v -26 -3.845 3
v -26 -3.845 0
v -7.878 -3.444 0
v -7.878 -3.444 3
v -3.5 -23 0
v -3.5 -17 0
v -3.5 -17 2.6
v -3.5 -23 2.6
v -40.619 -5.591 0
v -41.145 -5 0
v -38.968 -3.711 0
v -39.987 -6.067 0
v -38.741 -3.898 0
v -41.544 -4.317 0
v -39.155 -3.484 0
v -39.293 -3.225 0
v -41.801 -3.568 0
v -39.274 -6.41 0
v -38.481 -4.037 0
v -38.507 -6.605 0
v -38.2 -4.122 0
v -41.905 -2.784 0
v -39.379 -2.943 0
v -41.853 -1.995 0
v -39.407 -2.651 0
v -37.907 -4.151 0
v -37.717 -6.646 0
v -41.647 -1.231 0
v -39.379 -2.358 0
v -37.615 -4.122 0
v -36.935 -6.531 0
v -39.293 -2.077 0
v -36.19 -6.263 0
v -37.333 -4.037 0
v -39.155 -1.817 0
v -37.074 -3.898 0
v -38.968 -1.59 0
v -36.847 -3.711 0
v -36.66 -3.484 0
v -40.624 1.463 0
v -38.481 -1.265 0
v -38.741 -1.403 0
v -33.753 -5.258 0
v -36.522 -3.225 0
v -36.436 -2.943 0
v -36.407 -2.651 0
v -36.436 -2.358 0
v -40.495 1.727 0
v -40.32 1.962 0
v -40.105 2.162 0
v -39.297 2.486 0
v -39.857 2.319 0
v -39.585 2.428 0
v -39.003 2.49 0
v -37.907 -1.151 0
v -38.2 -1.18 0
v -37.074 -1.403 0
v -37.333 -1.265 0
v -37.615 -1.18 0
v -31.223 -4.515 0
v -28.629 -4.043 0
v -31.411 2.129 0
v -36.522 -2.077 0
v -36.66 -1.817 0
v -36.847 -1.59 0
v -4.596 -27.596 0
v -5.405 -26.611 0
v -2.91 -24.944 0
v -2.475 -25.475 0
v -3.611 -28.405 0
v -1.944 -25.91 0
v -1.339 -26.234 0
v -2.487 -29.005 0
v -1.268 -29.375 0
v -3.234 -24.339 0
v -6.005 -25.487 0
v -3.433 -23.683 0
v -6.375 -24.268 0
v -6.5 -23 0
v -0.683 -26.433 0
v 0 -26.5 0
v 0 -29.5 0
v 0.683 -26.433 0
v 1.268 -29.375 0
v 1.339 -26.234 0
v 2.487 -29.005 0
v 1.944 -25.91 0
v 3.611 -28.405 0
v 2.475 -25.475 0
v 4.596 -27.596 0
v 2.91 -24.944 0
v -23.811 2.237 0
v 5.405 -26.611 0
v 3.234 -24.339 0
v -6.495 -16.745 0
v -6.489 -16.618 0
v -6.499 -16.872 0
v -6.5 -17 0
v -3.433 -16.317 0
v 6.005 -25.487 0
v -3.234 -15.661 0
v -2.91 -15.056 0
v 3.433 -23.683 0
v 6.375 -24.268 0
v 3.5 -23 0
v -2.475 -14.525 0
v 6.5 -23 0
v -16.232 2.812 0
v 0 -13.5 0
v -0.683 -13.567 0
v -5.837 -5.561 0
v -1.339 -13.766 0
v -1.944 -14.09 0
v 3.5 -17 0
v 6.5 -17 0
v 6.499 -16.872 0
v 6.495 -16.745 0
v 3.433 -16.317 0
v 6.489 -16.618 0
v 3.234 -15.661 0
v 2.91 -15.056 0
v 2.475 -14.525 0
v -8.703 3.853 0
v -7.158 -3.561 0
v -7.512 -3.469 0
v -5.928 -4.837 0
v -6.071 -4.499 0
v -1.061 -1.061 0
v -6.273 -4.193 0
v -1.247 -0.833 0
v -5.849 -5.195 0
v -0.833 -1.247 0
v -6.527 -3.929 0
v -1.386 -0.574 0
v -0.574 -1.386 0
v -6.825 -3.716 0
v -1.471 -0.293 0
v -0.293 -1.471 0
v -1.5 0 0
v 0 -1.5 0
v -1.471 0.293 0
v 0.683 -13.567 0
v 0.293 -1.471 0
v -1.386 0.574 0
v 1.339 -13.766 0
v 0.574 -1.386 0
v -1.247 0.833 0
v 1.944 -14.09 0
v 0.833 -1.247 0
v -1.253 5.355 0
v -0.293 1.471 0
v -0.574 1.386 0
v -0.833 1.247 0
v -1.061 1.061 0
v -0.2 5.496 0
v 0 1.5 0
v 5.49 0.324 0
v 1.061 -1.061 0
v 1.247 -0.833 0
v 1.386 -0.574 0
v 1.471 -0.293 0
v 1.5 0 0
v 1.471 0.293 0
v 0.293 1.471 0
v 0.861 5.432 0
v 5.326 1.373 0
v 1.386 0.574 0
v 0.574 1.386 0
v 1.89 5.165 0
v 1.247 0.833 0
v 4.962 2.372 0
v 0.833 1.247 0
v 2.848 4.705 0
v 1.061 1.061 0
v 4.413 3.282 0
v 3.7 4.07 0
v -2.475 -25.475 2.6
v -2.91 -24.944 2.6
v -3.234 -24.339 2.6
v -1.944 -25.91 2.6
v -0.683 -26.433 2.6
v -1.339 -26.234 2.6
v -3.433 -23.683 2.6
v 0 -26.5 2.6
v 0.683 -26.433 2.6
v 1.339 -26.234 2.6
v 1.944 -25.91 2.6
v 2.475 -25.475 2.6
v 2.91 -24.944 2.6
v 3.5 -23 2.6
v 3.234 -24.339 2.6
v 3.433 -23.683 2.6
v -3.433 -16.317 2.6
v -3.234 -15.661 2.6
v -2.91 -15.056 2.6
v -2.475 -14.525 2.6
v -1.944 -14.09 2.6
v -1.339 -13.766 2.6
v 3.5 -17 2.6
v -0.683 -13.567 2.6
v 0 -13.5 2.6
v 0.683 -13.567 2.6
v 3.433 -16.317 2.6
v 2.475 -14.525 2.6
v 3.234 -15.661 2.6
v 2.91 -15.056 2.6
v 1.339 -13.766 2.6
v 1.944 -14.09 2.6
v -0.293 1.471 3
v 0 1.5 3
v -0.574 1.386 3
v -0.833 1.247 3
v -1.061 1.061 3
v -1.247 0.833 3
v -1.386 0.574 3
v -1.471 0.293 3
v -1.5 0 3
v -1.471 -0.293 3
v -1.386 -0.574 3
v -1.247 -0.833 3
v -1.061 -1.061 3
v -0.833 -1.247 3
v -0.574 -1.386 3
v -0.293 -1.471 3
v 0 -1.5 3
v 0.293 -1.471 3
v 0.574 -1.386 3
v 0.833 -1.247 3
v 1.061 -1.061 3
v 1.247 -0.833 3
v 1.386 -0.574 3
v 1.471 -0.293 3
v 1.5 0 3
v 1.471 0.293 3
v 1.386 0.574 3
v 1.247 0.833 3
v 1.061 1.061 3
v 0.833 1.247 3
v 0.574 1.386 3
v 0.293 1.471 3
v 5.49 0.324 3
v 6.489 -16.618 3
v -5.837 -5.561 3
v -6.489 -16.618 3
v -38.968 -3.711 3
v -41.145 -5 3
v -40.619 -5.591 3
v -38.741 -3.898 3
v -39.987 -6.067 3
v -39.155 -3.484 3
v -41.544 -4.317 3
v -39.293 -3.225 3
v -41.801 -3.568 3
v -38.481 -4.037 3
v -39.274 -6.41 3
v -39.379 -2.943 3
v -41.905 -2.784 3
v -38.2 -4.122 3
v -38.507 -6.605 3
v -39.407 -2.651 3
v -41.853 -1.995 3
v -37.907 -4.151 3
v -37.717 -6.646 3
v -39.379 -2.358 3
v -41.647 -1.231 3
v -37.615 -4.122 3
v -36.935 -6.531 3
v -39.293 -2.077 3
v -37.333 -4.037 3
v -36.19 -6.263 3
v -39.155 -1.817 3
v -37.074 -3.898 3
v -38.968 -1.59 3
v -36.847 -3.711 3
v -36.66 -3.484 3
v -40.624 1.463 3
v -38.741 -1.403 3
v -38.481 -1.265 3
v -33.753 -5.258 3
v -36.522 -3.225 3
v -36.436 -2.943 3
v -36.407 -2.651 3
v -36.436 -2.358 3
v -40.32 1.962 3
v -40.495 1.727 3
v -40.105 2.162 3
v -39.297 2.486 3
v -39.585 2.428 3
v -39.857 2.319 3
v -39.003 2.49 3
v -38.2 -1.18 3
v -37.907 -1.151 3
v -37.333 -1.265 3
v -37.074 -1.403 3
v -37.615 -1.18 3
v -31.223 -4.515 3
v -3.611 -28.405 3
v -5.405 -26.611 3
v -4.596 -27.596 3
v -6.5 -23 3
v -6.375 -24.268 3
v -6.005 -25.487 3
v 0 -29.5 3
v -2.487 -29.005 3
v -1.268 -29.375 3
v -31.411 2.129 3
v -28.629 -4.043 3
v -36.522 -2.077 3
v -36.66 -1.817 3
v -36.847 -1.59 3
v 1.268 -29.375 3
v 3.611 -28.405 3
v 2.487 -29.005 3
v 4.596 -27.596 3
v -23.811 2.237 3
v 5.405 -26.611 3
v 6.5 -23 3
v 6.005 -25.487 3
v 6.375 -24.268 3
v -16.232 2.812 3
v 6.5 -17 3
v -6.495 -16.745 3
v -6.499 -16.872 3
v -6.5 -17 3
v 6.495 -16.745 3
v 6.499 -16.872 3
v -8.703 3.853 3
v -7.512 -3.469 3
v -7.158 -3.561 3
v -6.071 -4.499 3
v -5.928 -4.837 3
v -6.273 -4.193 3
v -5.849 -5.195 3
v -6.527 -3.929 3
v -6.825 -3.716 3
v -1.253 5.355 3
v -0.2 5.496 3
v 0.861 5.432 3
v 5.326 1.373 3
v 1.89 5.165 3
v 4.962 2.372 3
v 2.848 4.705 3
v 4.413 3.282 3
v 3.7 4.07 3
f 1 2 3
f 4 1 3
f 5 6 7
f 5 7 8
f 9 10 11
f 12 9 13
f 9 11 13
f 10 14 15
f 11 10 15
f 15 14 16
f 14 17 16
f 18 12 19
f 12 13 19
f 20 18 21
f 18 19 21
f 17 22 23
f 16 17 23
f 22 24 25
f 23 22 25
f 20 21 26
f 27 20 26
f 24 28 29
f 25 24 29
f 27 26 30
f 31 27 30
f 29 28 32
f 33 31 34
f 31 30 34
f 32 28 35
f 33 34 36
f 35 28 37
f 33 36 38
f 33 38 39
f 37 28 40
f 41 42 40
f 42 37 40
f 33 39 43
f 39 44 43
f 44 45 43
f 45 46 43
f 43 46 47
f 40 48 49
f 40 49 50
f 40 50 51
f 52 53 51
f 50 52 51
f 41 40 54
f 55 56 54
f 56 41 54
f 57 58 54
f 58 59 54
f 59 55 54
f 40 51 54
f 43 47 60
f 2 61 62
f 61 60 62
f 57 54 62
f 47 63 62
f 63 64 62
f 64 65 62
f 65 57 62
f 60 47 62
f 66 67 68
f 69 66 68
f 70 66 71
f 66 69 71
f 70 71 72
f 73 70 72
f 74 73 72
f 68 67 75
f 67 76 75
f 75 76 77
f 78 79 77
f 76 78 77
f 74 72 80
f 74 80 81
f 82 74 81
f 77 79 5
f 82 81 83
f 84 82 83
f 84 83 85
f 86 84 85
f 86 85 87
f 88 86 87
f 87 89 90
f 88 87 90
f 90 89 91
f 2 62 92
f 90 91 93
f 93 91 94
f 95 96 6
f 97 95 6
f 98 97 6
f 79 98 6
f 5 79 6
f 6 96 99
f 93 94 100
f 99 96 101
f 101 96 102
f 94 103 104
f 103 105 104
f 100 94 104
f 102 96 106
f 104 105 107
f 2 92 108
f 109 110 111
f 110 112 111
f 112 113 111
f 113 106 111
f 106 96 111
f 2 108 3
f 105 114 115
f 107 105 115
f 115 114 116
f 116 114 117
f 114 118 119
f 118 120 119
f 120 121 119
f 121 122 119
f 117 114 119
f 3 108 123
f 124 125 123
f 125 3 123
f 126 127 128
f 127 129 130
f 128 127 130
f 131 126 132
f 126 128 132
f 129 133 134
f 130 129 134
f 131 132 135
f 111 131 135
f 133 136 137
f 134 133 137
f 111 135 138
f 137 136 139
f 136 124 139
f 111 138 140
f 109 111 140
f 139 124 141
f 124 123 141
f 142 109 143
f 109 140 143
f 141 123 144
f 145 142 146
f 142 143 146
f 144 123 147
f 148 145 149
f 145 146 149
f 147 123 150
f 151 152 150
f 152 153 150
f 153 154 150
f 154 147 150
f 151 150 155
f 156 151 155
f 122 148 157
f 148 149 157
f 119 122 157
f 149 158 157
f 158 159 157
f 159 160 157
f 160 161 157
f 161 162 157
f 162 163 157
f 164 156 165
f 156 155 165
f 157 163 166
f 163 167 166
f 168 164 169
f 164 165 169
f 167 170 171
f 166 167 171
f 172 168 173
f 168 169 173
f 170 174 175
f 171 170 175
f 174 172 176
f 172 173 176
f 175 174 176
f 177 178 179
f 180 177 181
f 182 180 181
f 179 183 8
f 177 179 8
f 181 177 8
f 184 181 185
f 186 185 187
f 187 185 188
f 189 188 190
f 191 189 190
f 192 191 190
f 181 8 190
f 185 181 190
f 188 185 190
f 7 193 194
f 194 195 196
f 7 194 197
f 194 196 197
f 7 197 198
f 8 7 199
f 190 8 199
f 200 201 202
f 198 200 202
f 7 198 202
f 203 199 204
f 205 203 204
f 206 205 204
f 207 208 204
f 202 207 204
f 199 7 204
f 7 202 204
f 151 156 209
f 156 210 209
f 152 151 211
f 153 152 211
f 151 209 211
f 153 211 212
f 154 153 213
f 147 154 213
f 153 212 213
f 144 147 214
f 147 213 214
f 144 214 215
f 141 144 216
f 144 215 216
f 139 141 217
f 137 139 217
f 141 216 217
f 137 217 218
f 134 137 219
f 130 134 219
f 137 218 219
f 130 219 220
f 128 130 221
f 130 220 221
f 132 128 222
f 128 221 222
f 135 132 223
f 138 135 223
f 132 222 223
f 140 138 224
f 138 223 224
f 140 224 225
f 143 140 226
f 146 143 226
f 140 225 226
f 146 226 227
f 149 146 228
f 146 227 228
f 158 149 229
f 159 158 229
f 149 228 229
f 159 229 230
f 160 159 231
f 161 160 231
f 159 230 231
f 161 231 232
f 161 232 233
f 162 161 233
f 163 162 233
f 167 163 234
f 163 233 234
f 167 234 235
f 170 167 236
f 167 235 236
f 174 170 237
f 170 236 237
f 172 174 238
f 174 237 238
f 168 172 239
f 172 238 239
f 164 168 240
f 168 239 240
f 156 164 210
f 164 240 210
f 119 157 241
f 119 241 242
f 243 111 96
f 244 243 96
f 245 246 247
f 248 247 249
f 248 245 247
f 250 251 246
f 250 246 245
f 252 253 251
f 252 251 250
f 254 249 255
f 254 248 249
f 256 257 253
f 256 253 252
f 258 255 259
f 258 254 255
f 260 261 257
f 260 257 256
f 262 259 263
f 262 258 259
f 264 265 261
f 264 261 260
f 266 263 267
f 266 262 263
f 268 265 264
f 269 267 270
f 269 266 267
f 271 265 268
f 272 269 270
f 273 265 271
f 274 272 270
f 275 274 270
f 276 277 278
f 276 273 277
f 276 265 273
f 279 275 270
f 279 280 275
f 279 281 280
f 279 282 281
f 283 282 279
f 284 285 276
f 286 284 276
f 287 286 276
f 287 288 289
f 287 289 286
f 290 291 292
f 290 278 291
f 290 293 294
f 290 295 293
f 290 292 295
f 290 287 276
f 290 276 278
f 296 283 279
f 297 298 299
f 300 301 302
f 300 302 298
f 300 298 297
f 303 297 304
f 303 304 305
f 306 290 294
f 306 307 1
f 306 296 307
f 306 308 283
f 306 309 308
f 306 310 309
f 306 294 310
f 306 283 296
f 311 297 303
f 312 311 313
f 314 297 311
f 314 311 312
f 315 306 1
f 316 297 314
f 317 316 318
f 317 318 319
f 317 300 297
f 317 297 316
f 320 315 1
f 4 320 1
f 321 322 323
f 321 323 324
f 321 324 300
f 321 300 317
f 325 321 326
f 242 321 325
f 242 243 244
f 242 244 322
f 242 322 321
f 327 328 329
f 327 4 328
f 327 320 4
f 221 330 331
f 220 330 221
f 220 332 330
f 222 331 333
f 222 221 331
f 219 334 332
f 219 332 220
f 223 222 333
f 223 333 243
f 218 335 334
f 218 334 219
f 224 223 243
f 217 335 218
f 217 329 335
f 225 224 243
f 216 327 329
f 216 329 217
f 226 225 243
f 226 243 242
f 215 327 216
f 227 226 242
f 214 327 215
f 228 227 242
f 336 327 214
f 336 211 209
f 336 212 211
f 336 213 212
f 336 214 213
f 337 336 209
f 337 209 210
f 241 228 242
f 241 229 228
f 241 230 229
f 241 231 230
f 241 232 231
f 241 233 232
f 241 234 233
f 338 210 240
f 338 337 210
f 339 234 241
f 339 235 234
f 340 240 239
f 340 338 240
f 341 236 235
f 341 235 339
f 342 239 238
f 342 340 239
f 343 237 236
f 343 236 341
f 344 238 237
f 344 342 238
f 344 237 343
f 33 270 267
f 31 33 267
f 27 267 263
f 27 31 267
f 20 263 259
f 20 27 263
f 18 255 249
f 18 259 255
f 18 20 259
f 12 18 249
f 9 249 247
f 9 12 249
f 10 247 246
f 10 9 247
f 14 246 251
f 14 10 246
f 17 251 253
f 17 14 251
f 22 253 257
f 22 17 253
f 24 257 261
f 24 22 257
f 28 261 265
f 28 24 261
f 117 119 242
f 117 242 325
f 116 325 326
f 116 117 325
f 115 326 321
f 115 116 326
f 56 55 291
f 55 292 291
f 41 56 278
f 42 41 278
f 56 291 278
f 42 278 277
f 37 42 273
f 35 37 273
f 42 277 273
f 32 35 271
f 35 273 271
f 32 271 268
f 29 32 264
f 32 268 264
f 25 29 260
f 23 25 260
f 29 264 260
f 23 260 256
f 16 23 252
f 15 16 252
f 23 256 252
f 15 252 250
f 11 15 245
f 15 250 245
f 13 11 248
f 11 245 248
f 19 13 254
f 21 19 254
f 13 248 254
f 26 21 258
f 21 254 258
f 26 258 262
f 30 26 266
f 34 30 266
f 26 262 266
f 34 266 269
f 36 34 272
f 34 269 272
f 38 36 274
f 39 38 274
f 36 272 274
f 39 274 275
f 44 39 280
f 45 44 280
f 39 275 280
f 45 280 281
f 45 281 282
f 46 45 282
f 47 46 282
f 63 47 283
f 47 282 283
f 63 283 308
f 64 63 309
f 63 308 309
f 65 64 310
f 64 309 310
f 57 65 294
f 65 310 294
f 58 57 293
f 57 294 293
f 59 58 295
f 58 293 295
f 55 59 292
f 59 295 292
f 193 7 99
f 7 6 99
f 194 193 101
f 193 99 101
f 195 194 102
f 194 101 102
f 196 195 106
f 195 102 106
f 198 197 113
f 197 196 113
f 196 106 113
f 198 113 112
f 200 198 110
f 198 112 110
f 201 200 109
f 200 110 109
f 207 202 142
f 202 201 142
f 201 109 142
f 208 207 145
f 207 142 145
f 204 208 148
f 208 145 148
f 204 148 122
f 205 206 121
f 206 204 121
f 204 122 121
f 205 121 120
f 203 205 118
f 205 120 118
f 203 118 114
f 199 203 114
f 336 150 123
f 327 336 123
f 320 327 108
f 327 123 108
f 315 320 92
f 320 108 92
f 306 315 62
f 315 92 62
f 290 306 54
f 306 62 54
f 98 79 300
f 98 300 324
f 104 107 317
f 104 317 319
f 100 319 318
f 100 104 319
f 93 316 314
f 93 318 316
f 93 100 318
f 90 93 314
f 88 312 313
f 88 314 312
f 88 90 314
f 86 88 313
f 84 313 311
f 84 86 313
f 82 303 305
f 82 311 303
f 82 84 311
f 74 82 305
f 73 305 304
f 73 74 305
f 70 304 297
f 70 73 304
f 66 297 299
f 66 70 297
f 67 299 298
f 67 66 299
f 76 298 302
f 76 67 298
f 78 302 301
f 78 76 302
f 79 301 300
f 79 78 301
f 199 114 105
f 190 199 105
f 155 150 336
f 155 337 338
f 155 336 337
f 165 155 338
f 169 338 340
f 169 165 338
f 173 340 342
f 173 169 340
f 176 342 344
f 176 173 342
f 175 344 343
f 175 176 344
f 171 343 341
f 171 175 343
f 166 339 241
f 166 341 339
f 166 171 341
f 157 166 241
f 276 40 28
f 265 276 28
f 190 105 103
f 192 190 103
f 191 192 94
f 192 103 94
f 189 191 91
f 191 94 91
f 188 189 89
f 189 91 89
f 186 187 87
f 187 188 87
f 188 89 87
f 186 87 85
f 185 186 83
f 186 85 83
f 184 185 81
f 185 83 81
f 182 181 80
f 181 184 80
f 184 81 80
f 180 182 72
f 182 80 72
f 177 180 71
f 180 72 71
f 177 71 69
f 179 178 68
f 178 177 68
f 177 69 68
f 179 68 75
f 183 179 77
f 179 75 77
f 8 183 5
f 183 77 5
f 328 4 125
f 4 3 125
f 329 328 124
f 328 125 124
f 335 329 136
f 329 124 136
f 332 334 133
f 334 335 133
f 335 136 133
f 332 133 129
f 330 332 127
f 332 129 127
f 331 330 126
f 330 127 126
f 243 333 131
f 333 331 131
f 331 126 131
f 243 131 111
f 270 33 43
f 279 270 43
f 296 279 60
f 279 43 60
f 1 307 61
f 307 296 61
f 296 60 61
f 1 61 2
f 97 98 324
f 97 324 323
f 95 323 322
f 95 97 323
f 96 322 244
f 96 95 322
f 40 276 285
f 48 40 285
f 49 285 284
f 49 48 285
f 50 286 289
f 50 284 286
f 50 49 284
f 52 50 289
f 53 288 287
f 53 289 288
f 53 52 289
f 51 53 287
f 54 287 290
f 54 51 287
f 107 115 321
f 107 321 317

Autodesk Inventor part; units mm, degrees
ref_plane "YZ Plane" through (0, 0, 0) normal (1, 0, 0) x (0, 1, 0)
ref_plane "XZ Plane" through (0, 0, 0) normal (0, 1, 0) x (-1, 0, 0)
ref_plane "XY Plane" through (0, 0, 0) normal (0, 0, 1) x (1, 0, 0)
sketch "スケッチ1" plane through (0, 0, 0) normal (0, 0, 1) x (1, 0, 0)
  line L0 (0, 0) -> (0, -20) construction
  line L1 (0, -20) -> (-37.9074, -2.6507) construction
  line L2 (-37.9074, -2.6507) -> (0, 0) construction
  arc A0 (-41.6469, -1.2309) -> (-36.19, -6.2633) centre (-37.9074, -2.6507) ccw
  arc A1 (5.4905, 0.3235) -> (-1.2529, 5.3554) centre (0, 0) ccw
  arc A2 (-6.5, -23) -> (6.5, -23) centre (0, -23) ccw
  arc A3 (3.5, -17) -> (-3.5, -17) centre (0, -17) ccw
  arc A4 (-3.5, -23) -> (3.5, -23) centre (0, -23) ccw
  line L3 (-3.5, -17) -> (-3.5, -23)
  line L4 (3.5, -17) -> (3.5, -23)
  line L5 (0, -23) -> (0, -17) construction
  line L6 (5.4905, 0.3235) -> (6.4887, -16.6176)
  line L7 (6.5, -17) -> (6.5, -23)
  arc A5 (6.5, -17) -> (6.4887, -16.6176) centre (0, -17) ccw
  line L8 (-6.5, -23) -> (-6.5, -17)
  arc A6 (-1.2529, 5.3554) -> (-5.4905, 0.3235) centre (0, 0) ccw construction
  line L9 (-5.4905, 0.3235) -> (-5.7734, -4.4787) construction
  arc A7 (-6.4887, -16.6176) -> (-6.5, -17) centre (0, -17) ccw
  line L10 (-5.8372, -5.5609) -> (-6.4887, -16.6176)
  arc A8 (-5.8372, -5.5609) -> (-7.8781, -3.4437) centre (-7.8338, -5.4432) ccw
  line L11 (-40.6241, 1.4629) -> (-41.6469, -1.2309)
  arc A9 (-26, -3.8454) -> (-36.19, -6.2633) centre (-25.4454, -28.8643) ccw
  line L12 (-26, -3.8454) -> (-7.8781, -3.4437)
  arc A10 (-39.0031, 2.49) -> (-40.6241, 1.4629) centre (-39.1283, 0.8949) ccw
  arc A11 (-39.0031, 2.49) -> (-1.2529, 5.3554) centre (-29.3534, 125.4645) ccw
  line L13 (-26.133, 2.1531) -> (-8.011, 2.5548) construction
  line L14 (-39.1283, 0.8949) -> (-37.9074, -2.6507) construction
  dimension "d0" = 20
  dimension "d2" = 38
  dimension "d3" = 4
  dimension "d13" = 6
  dimension "d14" = 3.5
  dimension "d15" = 6.5
  dimension "d21" = 86
  dimension "d27" = 2
  dimension "d32" = 5.5
  dimension "d35" = 88.73
  dimension "d36" = 3.2683
  dimension "d39" = 1.6
  dimension "d40" = 26
  dimension "d41" = 6
  dimension "d42" = 105
  dimension "d43" = 3.75
extrude "押し出し1" add sketch "スケッチ1" along normal blind 3
hole "穴1" at (-37.9074, -2.6507, 0) at (0, 0, 0) direction (0, 0, 1) diameter 3 end through all
sketch "スケッチ2" plane through (0, 0, 3) normal (0, 0, 1) x (1, 0, 0)
  arc A0 (3.5, -17) -> (-3.5, -17) centre (0, -17) ccw projected
  line L0 (3.5, -17) -> (3.5, -23) projected
  arc A1 (-3.5, -23) -> (3.5, -23) centre (0, -23) ccw projected
  line L1 (-3.5, -23) -> (-3.5, -17) projected
  point P0 (0, 0)
extrude "押し出し2" add sketch "スケッチ2" against normal blind 0.4
properties part number "COXA_YAW_SUPPORT-LINK_BACK"
